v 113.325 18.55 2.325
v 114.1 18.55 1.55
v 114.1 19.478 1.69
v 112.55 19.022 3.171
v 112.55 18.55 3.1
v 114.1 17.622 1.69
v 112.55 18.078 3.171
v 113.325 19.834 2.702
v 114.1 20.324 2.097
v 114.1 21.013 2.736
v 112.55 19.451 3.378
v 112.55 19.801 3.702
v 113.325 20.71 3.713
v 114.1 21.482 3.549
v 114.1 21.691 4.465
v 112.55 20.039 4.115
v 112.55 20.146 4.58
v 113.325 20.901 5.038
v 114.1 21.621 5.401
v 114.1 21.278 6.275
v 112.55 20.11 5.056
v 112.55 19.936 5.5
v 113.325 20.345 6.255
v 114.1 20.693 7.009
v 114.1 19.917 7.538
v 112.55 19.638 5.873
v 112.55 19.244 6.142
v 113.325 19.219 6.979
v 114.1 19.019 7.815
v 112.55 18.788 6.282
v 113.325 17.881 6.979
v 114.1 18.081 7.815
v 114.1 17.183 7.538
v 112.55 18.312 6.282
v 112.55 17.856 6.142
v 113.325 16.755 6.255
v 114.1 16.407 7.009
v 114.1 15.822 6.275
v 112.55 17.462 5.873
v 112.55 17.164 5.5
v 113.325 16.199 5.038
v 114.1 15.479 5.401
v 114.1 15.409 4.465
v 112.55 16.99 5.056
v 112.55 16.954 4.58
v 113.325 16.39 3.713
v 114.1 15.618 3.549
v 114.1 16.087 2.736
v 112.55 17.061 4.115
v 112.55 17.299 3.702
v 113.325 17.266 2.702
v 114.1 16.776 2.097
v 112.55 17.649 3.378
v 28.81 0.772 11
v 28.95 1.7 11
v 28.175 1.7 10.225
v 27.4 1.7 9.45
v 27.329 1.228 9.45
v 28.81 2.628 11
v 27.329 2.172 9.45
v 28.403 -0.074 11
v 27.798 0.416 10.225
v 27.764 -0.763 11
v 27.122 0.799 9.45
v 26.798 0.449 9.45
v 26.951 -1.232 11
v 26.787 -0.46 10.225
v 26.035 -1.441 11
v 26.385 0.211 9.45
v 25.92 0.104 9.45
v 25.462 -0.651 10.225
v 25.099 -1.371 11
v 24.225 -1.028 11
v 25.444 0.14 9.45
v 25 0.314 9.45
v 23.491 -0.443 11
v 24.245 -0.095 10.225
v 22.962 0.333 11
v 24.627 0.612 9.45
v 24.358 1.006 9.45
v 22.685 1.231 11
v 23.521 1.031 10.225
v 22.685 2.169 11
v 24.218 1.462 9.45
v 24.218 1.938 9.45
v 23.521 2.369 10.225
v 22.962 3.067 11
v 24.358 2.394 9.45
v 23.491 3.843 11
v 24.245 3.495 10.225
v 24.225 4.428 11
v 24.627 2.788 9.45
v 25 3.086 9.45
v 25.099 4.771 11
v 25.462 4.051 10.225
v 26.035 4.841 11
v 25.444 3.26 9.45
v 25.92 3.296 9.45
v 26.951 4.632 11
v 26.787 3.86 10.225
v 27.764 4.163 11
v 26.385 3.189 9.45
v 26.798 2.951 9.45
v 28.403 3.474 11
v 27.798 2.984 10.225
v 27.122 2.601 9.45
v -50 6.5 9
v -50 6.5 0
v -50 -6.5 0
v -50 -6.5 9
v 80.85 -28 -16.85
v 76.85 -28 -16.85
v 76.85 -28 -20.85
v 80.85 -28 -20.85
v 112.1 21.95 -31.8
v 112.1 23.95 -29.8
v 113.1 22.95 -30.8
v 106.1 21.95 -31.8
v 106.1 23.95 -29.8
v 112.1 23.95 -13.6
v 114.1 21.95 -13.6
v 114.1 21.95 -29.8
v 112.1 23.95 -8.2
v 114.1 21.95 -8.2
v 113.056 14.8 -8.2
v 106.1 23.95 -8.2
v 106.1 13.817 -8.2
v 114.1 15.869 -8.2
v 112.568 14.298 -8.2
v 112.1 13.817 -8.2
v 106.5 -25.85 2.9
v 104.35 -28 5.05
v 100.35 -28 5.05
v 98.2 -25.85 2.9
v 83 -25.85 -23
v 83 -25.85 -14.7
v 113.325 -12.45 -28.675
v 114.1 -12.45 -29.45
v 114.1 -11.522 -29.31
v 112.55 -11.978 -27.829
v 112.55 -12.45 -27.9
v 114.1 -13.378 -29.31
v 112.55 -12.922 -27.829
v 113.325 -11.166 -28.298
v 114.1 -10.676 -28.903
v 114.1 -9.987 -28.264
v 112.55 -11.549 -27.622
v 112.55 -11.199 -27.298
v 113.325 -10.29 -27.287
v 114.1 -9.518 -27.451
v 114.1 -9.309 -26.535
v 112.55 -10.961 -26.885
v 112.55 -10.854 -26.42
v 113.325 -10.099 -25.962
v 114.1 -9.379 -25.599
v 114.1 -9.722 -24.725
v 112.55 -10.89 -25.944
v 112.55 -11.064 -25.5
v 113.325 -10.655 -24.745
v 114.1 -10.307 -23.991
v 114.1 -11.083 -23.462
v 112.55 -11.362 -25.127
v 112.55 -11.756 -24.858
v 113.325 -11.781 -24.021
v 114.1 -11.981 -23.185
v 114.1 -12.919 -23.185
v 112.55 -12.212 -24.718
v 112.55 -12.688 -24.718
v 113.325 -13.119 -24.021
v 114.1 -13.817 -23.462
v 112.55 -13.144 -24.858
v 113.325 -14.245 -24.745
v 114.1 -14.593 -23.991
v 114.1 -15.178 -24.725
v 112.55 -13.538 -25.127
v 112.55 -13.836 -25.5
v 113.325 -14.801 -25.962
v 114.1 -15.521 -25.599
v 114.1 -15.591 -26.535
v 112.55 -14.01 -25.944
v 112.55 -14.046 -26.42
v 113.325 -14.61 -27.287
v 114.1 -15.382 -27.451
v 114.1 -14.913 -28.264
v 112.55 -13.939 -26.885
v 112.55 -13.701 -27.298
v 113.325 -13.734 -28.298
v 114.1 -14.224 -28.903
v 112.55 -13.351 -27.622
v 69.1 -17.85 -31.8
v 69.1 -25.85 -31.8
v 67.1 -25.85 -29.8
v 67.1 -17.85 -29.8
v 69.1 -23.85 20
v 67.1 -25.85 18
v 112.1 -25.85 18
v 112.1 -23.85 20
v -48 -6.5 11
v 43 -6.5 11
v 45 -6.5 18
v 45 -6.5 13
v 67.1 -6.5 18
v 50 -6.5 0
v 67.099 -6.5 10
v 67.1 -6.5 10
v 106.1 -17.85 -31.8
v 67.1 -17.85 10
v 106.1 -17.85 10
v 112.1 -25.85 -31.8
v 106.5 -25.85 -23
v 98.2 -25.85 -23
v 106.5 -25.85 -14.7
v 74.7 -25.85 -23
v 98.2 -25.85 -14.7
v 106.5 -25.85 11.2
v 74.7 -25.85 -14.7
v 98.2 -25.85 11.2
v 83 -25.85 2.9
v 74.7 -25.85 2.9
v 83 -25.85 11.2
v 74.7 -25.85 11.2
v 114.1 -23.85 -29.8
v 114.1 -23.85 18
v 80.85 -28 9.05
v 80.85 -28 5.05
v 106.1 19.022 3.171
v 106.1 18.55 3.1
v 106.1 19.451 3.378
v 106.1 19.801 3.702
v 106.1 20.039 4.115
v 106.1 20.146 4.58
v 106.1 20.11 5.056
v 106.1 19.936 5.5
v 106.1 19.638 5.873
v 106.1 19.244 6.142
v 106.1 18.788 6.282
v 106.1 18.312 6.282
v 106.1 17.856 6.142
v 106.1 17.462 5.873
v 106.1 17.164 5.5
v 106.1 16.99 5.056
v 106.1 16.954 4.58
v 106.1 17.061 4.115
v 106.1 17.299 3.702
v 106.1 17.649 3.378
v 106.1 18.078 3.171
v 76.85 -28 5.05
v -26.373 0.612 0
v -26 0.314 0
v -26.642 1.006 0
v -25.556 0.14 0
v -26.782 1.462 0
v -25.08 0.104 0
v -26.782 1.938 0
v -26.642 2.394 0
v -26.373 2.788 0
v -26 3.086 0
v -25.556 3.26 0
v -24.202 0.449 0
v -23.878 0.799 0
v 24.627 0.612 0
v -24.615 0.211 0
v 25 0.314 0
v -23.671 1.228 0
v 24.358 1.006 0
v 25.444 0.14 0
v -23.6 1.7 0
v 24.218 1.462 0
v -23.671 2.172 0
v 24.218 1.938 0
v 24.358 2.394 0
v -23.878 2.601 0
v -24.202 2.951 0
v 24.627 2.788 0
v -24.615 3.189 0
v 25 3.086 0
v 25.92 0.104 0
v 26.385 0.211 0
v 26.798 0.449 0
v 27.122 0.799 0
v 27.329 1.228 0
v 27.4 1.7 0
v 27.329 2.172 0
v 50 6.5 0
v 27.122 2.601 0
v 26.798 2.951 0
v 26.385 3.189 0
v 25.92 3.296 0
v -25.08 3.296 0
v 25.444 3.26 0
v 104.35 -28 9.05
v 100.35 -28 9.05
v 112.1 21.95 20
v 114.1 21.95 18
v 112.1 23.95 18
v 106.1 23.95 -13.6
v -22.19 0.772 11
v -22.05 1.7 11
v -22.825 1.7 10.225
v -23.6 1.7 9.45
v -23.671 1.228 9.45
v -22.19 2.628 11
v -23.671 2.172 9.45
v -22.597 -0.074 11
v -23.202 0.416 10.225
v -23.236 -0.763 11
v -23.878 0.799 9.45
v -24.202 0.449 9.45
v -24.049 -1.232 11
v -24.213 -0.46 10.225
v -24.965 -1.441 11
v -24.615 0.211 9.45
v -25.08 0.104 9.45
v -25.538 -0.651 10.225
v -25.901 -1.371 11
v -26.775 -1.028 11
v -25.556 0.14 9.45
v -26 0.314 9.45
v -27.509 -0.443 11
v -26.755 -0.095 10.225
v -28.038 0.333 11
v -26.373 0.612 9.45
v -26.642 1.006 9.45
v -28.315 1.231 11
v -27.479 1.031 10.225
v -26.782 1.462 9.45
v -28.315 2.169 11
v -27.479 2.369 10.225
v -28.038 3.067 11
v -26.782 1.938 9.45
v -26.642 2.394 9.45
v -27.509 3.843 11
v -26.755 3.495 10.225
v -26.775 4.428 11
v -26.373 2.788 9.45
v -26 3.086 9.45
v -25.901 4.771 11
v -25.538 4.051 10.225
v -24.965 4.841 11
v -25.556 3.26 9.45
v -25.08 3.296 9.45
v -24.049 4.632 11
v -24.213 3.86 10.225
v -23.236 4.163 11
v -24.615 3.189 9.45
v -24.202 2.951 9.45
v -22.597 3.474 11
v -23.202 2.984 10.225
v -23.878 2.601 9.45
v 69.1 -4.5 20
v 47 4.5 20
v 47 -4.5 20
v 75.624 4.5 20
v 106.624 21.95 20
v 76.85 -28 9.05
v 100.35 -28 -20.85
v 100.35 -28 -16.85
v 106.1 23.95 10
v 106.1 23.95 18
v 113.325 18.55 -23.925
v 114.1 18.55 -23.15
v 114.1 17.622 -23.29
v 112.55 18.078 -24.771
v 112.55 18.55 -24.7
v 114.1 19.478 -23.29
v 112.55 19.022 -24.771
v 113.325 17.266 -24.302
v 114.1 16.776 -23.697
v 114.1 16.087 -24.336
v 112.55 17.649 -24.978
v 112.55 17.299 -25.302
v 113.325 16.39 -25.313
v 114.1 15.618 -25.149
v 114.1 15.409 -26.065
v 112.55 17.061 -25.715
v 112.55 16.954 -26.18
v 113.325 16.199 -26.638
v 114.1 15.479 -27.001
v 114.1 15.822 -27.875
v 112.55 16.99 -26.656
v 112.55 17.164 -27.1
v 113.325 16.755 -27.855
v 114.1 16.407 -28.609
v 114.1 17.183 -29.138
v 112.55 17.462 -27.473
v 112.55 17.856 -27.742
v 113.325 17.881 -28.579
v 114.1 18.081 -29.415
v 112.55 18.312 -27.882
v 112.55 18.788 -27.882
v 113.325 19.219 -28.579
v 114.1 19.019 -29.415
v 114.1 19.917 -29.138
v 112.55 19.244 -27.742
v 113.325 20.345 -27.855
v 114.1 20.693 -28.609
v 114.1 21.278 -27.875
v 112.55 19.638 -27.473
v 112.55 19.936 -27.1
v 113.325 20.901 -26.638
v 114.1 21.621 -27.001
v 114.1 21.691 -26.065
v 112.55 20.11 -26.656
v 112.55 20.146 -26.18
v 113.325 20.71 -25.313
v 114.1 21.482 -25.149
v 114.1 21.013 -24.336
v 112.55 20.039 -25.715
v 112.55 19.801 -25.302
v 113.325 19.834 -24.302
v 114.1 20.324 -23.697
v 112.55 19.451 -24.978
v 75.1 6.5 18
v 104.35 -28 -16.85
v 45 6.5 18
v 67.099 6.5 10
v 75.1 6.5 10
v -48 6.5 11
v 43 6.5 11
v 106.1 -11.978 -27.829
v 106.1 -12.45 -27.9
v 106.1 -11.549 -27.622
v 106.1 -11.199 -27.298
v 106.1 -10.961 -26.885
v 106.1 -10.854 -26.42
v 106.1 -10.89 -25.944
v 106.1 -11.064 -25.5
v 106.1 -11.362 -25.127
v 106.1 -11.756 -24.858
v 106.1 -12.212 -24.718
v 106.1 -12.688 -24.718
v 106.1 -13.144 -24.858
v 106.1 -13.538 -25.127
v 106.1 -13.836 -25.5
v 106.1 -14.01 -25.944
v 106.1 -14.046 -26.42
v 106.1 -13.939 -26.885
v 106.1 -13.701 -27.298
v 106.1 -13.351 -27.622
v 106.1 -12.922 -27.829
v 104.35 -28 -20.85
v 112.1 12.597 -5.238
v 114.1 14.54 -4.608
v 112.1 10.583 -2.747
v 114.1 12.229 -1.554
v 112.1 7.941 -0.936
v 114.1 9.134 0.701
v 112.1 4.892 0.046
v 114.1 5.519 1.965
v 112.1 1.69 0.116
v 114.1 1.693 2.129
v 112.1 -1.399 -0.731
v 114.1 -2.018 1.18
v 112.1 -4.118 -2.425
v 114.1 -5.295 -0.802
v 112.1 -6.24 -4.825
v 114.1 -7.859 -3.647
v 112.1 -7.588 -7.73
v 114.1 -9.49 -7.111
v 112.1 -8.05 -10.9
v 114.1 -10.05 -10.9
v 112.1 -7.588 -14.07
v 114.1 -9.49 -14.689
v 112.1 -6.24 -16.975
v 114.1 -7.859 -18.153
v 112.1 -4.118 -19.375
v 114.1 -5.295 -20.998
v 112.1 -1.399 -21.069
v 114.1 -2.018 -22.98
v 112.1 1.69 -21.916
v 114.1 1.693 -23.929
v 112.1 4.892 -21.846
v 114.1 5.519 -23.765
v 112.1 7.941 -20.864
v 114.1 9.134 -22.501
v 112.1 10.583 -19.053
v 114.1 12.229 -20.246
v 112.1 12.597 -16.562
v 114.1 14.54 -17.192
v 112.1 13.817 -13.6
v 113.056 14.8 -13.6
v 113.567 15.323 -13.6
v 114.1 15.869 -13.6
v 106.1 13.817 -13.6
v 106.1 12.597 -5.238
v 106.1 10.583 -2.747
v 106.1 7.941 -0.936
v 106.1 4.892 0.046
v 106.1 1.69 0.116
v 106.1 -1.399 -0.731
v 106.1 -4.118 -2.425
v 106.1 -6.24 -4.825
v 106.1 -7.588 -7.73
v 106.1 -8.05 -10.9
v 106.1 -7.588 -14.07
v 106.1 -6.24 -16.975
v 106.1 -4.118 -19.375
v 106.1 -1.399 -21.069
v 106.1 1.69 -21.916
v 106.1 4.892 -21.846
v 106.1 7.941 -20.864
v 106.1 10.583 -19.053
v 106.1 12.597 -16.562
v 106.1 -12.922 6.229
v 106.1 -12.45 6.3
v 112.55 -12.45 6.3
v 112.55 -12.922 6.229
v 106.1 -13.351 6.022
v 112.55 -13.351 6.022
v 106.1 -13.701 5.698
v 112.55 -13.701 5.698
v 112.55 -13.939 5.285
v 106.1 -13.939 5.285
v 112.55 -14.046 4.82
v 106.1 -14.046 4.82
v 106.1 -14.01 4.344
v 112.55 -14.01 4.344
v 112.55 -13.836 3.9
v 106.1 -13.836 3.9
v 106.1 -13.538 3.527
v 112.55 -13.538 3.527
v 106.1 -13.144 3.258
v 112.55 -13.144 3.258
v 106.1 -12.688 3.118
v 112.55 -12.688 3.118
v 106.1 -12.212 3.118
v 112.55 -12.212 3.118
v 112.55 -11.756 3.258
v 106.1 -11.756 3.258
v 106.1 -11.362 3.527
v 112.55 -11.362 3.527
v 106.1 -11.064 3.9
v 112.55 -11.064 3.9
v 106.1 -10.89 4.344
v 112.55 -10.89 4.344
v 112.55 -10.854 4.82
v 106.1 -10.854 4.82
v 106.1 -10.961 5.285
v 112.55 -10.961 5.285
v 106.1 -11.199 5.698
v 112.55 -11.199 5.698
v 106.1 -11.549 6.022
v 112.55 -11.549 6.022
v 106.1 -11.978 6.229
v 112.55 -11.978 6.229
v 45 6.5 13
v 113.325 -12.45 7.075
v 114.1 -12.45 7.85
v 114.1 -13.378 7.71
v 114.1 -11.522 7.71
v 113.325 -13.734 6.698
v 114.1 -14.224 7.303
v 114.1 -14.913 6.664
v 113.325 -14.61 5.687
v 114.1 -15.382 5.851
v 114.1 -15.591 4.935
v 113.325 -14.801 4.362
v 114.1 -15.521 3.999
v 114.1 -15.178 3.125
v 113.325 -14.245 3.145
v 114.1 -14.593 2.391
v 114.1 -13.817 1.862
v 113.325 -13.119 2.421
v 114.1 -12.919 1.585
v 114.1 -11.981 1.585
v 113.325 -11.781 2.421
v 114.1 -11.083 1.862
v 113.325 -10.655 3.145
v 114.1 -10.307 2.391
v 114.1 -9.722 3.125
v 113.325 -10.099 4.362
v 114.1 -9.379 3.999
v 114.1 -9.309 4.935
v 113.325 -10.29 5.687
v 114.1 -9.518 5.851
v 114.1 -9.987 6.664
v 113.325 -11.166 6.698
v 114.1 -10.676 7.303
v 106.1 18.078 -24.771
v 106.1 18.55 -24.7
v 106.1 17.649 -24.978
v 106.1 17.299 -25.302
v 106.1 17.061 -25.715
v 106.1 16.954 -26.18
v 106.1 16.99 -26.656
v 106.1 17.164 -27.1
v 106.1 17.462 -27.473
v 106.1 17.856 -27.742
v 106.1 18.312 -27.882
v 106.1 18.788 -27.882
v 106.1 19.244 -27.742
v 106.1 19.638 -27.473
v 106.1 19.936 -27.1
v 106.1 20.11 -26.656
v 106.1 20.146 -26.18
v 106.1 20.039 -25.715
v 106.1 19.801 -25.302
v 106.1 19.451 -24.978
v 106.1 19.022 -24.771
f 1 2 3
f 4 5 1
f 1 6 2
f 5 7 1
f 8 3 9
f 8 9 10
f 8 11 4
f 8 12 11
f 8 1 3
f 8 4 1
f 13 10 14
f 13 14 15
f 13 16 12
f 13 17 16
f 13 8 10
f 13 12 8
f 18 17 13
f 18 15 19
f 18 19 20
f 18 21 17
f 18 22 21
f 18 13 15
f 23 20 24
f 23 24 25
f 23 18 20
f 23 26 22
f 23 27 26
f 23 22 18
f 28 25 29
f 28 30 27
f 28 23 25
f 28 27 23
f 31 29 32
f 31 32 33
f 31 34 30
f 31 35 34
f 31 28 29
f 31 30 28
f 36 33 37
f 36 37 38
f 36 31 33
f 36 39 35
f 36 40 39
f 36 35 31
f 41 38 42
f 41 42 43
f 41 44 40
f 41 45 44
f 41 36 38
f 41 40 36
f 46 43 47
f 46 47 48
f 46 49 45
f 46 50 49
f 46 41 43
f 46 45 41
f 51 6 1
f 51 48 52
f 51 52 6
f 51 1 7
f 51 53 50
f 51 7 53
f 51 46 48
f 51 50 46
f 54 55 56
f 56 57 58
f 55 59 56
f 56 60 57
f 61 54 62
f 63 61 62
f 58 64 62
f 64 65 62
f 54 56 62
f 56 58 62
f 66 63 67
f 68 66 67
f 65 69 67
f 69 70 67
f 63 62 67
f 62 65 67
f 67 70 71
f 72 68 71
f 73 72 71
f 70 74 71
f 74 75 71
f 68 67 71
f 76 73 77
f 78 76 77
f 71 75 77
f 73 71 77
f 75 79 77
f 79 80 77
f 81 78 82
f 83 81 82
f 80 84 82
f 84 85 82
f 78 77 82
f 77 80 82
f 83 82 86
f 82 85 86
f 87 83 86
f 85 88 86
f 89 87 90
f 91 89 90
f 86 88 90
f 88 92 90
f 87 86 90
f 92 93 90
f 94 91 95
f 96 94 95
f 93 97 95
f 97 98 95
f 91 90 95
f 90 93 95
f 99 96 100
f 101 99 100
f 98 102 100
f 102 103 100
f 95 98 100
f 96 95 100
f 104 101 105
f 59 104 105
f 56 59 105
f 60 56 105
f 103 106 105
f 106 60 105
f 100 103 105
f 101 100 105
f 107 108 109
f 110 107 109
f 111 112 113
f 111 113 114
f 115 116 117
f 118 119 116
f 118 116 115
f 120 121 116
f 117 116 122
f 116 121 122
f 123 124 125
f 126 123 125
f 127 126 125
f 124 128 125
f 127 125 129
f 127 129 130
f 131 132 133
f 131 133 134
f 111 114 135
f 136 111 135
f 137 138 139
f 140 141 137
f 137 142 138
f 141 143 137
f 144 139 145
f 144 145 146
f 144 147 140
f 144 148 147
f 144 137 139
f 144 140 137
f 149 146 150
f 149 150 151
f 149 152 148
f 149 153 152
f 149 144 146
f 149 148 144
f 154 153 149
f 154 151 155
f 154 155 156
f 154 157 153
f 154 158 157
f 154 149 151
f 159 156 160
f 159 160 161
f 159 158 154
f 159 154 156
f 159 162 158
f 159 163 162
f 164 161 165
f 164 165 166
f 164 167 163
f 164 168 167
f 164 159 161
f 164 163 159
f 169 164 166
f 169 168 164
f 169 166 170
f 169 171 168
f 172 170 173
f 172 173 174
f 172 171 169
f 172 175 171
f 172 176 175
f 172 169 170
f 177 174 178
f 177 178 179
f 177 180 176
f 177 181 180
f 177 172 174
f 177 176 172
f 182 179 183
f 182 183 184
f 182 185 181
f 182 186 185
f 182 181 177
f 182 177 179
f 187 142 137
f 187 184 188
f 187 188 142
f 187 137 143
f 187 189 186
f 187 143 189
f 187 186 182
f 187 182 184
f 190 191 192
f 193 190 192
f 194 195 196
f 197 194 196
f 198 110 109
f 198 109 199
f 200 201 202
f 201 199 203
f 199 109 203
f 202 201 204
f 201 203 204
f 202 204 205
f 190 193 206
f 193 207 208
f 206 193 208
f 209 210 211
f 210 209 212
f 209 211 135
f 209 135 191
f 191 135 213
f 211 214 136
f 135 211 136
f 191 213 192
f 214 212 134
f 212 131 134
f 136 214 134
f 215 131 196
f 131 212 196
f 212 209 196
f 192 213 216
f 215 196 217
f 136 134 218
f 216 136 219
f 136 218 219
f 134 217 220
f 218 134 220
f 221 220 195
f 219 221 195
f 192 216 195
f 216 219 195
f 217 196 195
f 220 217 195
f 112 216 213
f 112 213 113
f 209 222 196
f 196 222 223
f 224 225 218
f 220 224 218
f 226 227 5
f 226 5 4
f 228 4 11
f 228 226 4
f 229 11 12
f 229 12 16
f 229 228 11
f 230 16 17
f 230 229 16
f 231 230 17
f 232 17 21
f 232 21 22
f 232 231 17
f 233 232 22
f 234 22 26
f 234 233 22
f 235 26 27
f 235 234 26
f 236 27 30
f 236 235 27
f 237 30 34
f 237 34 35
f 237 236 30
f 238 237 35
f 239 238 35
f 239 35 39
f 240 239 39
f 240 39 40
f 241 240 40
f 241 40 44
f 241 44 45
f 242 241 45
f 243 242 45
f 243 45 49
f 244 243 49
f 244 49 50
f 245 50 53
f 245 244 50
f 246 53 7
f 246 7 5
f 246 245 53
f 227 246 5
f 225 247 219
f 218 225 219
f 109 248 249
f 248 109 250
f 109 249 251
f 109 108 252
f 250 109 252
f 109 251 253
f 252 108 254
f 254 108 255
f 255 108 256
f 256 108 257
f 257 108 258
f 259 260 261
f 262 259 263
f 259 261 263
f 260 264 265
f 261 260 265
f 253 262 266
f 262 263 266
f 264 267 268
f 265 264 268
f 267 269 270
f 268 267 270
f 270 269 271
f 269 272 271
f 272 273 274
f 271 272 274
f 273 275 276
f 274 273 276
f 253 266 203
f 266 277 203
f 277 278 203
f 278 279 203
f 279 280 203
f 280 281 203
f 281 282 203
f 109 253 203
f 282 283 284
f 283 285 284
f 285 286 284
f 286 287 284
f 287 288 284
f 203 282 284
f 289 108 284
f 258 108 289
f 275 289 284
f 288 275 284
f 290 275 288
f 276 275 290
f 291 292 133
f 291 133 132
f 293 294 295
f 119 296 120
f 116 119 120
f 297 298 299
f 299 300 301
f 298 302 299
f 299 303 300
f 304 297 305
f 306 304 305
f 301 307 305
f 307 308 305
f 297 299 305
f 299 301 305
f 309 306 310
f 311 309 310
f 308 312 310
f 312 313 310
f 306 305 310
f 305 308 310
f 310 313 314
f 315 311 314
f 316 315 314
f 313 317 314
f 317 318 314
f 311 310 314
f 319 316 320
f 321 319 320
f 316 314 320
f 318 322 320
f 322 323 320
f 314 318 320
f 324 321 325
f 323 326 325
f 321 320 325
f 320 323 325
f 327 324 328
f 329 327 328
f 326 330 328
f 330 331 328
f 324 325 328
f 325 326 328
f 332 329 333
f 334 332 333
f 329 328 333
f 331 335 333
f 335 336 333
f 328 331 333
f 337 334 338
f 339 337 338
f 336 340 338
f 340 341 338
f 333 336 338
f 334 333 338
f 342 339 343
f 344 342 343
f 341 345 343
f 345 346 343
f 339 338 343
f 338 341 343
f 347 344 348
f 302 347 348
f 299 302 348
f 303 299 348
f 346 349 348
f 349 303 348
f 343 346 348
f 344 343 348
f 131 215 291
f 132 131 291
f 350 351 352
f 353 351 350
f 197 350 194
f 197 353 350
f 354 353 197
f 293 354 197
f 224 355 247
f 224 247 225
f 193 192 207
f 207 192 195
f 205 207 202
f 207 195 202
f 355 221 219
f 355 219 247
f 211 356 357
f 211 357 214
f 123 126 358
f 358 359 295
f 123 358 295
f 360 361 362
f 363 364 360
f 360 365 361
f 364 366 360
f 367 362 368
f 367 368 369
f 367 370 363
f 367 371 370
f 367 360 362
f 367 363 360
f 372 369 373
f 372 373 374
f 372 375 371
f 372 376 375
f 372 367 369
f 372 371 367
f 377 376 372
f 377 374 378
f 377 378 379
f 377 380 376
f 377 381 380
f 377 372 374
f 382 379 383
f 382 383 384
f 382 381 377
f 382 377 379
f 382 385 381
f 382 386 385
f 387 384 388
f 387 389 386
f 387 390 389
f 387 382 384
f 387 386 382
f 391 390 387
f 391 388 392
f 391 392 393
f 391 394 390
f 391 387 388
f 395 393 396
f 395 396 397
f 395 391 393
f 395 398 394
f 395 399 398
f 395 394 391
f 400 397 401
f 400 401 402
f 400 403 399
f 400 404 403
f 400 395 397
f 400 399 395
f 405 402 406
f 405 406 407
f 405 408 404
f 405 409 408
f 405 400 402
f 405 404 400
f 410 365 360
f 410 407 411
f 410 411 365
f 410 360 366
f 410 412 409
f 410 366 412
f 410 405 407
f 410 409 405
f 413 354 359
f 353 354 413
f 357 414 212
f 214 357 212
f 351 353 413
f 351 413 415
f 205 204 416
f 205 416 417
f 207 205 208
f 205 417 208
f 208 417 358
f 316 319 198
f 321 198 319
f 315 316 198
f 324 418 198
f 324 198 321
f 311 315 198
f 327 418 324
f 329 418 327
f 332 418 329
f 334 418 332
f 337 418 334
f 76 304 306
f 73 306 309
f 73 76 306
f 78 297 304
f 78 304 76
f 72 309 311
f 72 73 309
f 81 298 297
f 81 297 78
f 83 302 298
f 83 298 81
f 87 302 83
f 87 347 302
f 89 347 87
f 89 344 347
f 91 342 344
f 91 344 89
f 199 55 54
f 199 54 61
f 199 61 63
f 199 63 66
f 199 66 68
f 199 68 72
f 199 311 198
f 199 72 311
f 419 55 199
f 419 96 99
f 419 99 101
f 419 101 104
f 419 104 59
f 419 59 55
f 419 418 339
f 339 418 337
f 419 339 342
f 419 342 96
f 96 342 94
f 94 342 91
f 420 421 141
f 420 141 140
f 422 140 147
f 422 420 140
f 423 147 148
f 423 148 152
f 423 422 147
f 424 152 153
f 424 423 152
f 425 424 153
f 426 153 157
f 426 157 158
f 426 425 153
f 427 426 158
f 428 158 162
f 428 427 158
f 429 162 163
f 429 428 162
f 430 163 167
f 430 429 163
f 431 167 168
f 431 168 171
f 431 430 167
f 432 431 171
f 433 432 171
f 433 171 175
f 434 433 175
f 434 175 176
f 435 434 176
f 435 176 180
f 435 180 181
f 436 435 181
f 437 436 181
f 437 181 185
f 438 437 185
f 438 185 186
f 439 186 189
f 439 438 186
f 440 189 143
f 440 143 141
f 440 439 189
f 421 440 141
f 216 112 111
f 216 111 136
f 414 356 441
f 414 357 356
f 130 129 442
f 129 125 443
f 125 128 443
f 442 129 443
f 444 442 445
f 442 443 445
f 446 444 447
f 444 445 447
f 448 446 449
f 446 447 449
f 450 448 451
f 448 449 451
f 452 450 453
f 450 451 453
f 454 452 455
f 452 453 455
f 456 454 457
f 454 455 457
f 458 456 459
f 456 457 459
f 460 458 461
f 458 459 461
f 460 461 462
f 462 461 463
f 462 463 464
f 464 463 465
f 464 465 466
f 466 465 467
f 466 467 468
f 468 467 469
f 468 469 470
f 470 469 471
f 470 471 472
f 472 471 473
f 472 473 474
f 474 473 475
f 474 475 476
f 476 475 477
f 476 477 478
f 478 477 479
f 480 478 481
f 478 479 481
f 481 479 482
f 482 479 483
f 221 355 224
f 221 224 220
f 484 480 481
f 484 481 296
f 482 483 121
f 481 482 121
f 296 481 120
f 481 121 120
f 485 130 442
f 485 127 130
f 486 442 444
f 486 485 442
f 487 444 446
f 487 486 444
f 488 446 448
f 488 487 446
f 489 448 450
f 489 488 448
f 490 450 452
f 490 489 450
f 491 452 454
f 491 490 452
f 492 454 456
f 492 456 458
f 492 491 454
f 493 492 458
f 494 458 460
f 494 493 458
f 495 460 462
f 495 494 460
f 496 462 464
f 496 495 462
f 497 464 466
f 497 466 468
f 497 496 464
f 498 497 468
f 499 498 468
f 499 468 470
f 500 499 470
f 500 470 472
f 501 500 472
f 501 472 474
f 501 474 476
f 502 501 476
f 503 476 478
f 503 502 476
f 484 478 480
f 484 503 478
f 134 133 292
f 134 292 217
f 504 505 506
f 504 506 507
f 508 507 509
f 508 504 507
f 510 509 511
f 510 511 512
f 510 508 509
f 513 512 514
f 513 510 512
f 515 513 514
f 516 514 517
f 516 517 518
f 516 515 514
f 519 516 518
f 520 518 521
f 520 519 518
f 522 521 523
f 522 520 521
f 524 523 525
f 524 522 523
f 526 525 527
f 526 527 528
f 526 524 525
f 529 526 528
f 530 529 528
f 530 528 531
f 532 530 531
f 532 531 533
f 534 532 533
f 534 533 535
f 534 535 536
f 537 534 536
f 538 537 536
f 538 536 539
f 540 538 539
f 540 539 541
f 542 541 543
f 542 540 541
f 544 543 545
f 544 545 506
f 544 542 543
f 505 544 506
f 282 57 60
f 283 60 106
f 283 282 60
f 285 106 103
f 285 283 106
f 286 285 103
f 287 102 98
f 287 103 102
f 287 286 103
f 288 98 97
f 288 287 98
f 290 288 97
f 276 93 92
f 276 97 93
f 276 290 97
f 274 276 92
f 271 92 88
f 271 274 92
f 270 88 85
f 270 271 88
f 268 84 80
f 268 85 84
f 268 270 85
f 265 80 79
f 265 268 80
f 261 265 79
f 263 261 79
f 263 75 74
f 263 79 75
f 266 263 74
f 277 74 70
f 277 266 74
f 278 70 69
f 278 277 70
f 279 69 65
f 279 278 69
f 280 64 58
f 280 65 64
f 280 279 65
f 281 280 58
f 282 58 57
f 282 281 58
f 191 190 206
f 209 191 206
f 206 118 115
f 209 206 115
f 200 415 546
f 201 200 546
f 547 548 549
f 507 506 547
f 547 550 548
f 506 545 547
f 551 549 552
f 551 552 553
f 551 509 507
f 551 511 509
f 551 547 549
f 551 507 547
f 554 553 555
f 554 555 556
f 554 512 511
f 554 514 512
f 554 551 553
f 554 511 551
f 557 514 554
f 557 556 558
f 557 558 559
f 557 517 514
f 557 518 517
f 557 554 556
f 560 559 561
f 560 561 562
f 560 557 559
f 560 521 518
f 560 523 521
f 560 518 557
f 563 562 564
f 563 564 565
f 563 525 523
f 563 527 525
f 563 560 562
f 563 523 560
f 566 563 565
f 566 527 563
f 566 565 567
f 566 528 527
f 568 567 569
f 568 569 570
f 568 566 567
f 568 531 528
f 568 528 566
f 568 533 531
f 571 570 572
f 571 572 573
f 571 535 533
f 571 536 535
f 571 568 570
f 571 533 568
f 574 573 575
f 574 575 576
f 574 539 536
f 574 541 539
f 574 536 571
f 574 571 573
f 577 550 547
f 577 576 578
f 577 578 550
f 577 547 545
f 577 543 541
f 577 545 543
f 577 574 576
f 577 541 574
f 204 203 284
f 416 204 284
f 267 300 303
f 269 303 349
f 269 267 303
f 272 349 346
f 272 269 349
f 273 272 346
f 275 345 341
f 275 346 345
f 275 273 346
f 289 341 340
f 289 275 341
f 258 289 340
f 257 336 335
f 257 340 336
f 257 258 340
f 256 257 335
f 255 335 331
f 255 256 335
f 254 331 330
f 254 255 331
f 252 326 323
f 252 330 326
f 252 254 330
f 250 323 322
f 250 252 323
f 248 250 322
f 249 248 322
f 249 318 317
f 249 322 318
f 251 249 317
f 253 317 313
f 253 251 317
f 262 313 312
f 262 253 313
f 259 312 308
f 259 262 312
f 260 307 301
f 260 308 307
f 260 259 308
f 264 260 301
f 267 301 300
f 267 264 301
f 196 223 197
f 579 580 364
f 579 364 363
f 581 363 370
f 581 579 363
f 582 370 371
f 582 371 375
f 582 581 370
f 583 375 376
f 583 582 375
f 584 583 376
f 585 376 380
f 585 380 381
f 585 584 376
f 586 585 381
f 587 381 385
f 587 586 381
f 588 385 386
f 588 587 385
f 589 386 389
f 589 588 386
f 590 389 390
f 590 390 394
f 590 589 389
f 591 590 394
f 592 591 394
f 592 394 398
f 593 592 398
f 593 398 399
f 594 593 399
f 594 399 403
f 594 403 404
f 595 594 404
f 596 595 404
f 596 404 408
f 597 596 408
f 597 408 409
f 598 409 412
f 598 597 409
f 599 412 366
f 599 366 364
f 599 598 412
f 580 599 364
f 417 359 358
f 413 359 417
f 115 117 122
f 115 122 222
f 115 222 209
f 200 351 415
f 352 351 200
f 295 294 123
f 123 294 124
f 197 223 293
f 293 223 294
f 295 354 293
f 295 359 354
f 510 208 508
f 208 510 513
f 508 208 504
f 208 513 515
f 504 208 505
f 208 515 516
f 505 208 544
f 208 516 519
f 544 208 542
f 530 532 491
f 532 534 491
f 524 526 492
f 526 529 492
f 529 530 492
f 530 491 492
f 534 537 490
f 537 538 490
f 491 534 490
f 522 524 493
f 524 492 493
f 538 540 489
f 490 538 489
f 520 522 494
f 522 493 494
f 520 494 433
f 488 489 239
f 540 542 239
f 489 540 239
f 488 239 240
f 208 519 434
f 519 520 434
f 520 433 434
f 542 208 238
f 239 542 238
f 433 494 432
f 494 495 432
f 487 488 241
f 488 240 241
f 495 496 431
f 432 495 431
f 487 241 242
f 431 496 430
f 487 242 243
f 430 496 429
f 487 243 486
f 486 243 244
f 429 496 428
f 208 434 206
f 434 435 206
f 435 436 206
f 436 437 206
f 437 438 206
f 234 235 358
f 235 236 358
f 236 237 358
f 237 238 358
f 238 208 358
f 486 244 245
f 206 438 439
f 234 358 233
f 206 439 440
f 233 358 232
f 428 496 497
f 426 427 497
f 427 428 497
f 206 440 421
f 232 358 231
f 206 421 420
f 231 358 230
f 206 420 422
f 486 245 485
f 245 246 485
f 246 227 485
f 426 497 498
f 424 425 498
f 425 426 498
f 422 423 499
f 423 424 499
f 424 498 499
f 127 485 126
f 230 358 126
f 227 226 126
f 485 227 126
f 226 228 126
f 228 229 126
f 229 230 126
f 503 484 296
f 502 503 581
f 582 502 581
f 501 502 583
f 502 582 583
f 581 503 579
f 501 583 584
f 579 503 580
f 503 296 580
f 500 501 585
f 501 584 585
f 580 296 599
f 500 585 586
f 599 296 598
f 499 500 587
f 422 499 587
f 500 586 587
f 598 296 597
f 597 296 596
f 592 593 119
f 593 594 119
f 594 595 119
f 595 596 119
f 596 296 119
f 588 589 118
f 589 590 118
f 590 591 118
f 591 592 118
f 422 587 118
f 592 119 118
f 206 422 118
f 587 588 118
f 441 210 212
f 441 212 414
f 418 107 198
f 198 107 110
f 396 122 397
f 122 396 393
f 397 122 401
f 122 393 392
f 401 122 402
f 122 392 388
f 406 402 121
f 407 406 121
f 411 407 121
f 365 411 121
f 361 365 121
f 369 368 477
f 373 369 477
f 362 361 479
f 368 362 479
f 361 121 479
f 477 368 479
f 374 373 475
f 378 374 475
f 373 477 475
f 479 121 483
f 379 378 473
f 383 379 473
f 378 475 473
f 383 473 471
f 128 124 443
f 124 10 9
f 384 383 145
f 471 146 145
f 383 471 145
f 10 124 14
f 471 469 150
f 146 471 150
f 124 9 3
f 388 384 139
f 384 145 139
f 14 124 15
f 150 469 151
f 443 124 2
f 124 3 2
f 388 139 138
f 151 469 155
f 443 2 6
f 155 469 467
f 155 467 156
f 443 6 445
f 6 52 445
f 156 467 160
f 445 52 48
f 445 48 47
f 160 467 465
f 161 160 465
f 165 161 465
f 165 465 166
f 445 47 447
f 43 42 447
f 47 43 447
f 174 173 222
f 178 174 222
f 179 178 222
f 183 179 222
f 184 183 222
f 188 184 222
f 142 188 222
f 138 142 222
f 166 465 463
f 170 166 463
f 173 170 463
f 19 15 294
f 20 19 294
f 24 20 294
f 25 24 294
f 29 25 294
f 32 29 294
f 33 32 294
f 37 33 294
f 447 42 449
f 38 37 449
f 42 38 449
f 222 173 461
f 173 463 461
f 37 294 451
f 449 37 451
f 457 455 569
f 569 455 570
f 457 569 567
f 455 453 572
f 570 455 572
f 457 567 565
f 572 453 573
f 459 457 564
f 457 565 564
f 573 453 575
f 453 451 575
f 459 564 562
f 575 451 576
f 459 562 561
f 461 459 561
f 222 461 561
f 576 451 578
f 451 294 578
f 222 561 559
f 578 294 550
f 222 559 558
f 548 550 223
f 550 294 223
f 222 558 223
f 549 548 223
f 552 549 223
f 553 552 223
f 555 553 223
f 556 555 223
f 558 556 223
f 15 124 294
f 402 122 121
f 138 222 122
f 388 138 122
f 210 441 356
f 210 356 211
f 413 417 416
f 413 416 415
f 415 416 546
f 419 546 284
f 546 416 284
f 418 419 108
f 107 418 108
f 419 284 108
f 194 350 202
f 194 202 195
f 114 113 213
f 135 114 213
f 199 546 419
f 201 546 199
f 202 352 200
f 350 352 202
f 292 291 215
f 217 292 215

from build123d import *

# Parameters (mm, degrees)
SKETCH1_W           = 100
SKETCH1_H           = 13
SKETCH1_R           = 1.6
BOSS_EXTRUDE1_DEPTH = 10
SKETCH2_R           = 1.6
BOSS_EXTRUDE2_DEPTH = 10
SKETCH4_R           = 1.6
SKETCH4_R_2         = 11.1
BOSS_EXTRUDE3_DEPTH = 8
SKETCH5_W           = 47
SKETCH5_H           = 51.8
BOSS_EXTRUDE4_DEPTH = 8
SKETCH6_W           = 39
SKETCH6_H           = 11.35
BOSS_EXTRUDE5_DEPTH = 10
BOSS_EXTRUDE6_DEPTH = 8
SKETCH8_W           = 10
SKETCH8_H           = 10
BOSS_EXTRUDE7_DEPTH = 2.15
CHAMFER1_SIZE2      = 17.09924405
CHAMFER1_SIZE       = 10
CHAMFER3_SIZE       = 2
CHAMFER4_SIZE       = 3
CHAMFER5_SIZE       = 1.55
SKETCH9_W           = 95
SKETCH9_H           = 9
CUT_EXTRUDE1_DEPTH  = 126.670601176
CHAMFER6_SIZE       = 1.55
CHAMFER7_SIZE       = 2
SKETCH11_W          = 47
SKETCH11_H          = 8
CUT_EXTRUDE3_DEPTH  = 132.535746092
CUT_EXTRUDE4_DEPTH  = 170.481709928
CHAMFER9_SIZE       = 2


# Some blends are built 0.0001 mm under size
with BuildPart() as part:
    # Sketch1 → Boss-Extrude1 (new body)
    with BuildSketch(Plane.XY):
        Rectangle(SKETCH1_W, SKETCH1_H)
        with Locations((25.8, 1.7)):
            Circle(SKETCH1_R, mode=Mode.SUBTRACT)
        with Locations((-25.2, 1.7)):
            Circle(SKETCH1_R, mode=Mode.SUBTRACT)
    extrude(amount=BOSS_EXTRUDE1_DEPTH)

    # Sketch2 → Boss-Extrude2 (add)
    with BuildSketch(Plane.XY.offset(10)):
        Polygon((50, -6.5), (106.1, -6.5), (106.1, 6.5), (50, 6.5), (-50, 6.5), (-50, -6.5), align=None)
        with Locations((25.8, 1.7)):
            Circle(SKETCH2_R, mode=Mode.SUBTRACT)
        with Locations((-25.2, 1.7)):
            Circle(SKETCH2_R, mode=Mode.SUBTRACT)
    extrude(amount=BOSS_EXTRUDE2_DEPTH)

    # Sketch4 → Boss-Extrude3 (add)
    with BuildSketch(Plane(origin=(106.1, 0, 0), x_dir=(0, 0, -1), z_dir=(1, 0, 0))):
        Polygon((-20, -6.5), (-20, -17.85), (31.8, -17.85), (31.8, 23.95), (-20, 23.95), align=None)
        with Locations((-4.7, 18.55)):
            Circle(SKETCH4_R, mode=Mode.SUBTRACT)
        with Locations(Location((26.3, 18.55, 0), (0, 0, 180))):
            Circle(SKETCH4_R, mode=Mode.SUBTRACT)
        with Locations((26.3, -12.45)):
            Circle(SKETCH4_R, mode=Mode.SUBTRACT)
        with Locations(Location((-4.7, -12.45, 0), (0, 0, 180))):
            Circle(SKETCH4_R, mode=Mode.SUBTRACT)
        with Locations((10.9, 3.05)):
            Circle(SKETCH4_R_2, mode=Mode.SUBTRACT)
    extrude(amount=BOSS_EXTRUDE3_DEPTH)

    # Sketch5 → Boss-Extrude4 (add)
    with BuildSketch(Plane.XZ.offset(17.85)):
        with Locations((90.6, -5.9)):
            Rectangle(SKETCH5_W, SKETCH5_H)
    extrude(amount=BOSS_EXTRUDE4_DEPTH)

    # Sketch6 → Boss-Extrude5 (add)
    with BuildSketch(Plane.XY.offset(20)):
        Polygon((106.1, 23.95), (75.1, 6.5), (106.1, 6.5), align=None)
        with Locations((86.6, -12.175)):
            Rectangle(SKETCH6_W, SKETCH6_H)
    extrude(amount=-BOSS_EXTRUDE5_DEPTH)

    # Sketch7 → Boss-Extrude6 (add)
    with BuildSketch(Plane(origin=(0, 0, -31.8), x_dir=(-1, 0, 0), z_dir=(0, 0, -1))):
        Polygon((-67.1, -17.85), (-67.1, -6.5), (-67.1, 1.996774194), (-106.1, 23.95), (-114.1, 23.95), (-114.1, -25.85), (-67.1, -25.85), align=None)
    extrude(amount=BOSS_EXTRUDE6_DEPTH)

    # Sketch8 → Boss-Extrude7 (add)
    with BuildSketch(Plane.XZ.offset(25.85)):
        with Locations((78.85, 7.05)):
            Rectangle(SKETCH8_W, SKETCH8_H)
        with Locations((102.35, 7.05)):
            Rectangle(SKETCH8_W, SKETCH8_H)
        with Locations((102.35, -18.85)):
            Rectangle(SKETCH8_W, SKETCH8_H)
        with Locations((78.85, -18.85)):
            Rectangle(SKETCH8_W, SKETCH8_H)
    extrude(amount=BOSS_EXTRUDE7_DEPTH)

    # Chamfer1
    chamfer1_edges = [part.edges().sort_by_distance(p)[0] for p in [
        (50, 0, 10),
    ]]
    chamfer1_side = [part.faces().sort_by_distance(p)[0] for p in [
        (50, 0, 9.8),
    ]]
    chamfer(chamfer1_edges, length=CHAMFER1_SIZE - 0.0001, length2=CHAMFER1_SIZE2 - 0.0001, reference=chamfer1_side[0])  # a hair under: the kernel refuses the full size

    # Chamfer3
    chamfer3_edges = [part.edges().sort_by_distance(p)[0] for p in [
        (86.6, 12.973387097, -39.8),
        (110.1, 23.95, -39.8),
        (114.1, -0.95, -39.8),
        (90.6, -25.85, -39.8),
        (-50, 0, 20),
        (114.1, -0.95, 20),
        (114.1, 23.95, -9.9),
        (110.1, 23.95, 20),
        (114.1, 3.05, 0.2),
        (67.1, -16.175, 20),
        (114.1, -25.85, -9.9),
        (90.6, -25.85, 20),
    ]]
    chamfer(chamfer3_edges, length=CHAMFER3_SIZE)

    # Chamfer4
    # the kernel refuses this chamfer: 3 mm, written as the material it takes off along each edge
    with BuildSketch(Plane(origin=(115.065048964, -28, 2.05), x_dir=(0, -0.027495876610586775, 0.9996219169112968), z_dir=(-1, 0, 0))) as chamfer4_piece_1_section:
        Polygon((CHAMFER4_SIZE * 0.999621916911, CHAMFER4_SIZE * 0.0274958766106), (-CHAMFER4_SIZE * 0.0274958766106, CHAMFER4_SIZE * 0.999621916911), (0, 0), align=None)
    chamfer4_piece_1 = extrude(amount=25.430097928, mode=Mode.PRIVATE)
    chamfer4_piece_1 = split(chamfer4_piece_1, bisect_by=Plane(origin=(102.35, -25.85, 3.119652888), z_dir=(0, -1, 0)), keep=Keep.TOP, mode=Mode.PRIVATE)
    add(chamfer4_piece_1, mode=Mode.SUBTRACT)
    with BuildSketch(Plane(origin=(97.35, -28, -5.665048964), x_dir=(0.9996219169112965, -0.02749587661058676, 0), z_dir=(0, 0, 1))) as chamfer4_piece_2_section:
        Polygon((CHAMFER4_SIZE * 0.999621916911, CHAMFER4_SIZE * 0.0274958766106), (-CHAMFER4_SIZE * 0.0274958766106, CHAMFER4_SIZE * 0.999621916911), (0, 0), align=None)
    chamfer4_piece_2 = extrude(amount=25.430097928, mode=Mode.PRIVATE)
    chamfer4_piece_2 = split(chamfer4_piece_2, bisect_by=Plane(origin=(98.419652888, -25.85, 7.05), z_dir=(0, -1, 0)), keep=Keep.TOP, mode=Mode.PRIVATE)
    add(chamfer4_piece_2, mode=Mode.SUBTRACT)
    with BuildSketch(Plane(origin=(89.634951036, -28, 12.05), x_dir=(0, -0.02749587661058678, -0.9996219169112968), z_dir=(1, 0, 0))) as chamfer4_piece_3_section:
        Polygon((CHAMFER4_SIZE * 0.999621916911, CHAMFER4_SIZE * 0.0274958766106), (-CHAMFER4_SIZE * 0.0274958766106, CHAMFER4_SIZE * 0.999621916911), (0, 0), align=None)
    chamfer4_piece_3 = extrude(amount=25.430097928, mode=Mode.PRIVATE)
    chamfer4_piece_3 = split(chamfer4_piece_3, bisect_by=Plane(origin=(102.35, -25.85, 10.980347112), z_dir=(0, -1, 0)), keep=Keep.TOP, mode=Mode.PRIVATE)
    add(chamfer4_piece_3, mode=Mode.SUBTRACT)
    with BuildSketch(Plane(origin=(107.35, -28, 19.765048964), x_dir=(0.027495876610586768, 0.9996219169112968, 0), z_dir=(0, 0, -1))) as chamfer4_piece_4_section:
        Polygon((CHAMFER4_SIZE * 0.999621916911, -CHAMFER4_SIZE * 0.0274958766106), (-CHAMFER4_SIZE * 0.0274958766106, -CHAMFER4_SIZE * 0.999621916911), (0, 0), align=None)
    chamfer4_piece_4 = extrude(amount=25.430097928, mode=Mode.PRIVATE)
    chamfer4_piece_4 = split(chamfer4_piece_4, bisect_by=Plane(origin=(106.280347112, -25.85, 7.05), z_dir=(0, -1, 0)), keep=Keep.TOP, mode=Mode.PRIVATE)
    add(chamfer4_piece_4, mode=Mode.SUBTRACT)
    with BuildSketch(Plane(origin=(91.565048964, -28, 2.05), x_dir=(0, -0.027495876610586775, 0.9996219169112968), z_dir=(-1, 0, 0))) as chamfer4_piece_5_section:
        Polygon((CHAMFER4_SIZE * 0.999621916911, CHAMFER4_SIZE * 0.0274958766106), (-CHAMFER4_SIZE * 0.0274958766106, CHAMFER4_SIZE * 0.999621916911), (0, 0), align=None)
    chamfer4_piece_5 = extrude(amount=25.430097928, mode=Mode.PRIVATE)
    chamfer4_piece_5 = split(chamfer4_piece_5, bisect_by=Plane(origin=(78.85, -25.85, 3.119652888), z_dir=(0, -1, 0)), keep=Keep.TOP, mode=Mode.PRIVATE)
    add(chamfer4_piece_5, mode=Mode.SUBTRACT)
    with BuildSketch(Plane(origin=(73.85, -28, -5.665048964), x_dir=(-0.027495876610586768, 0.9996219169112968, 0), z_dir=(0, 0, 1))) as chamfer4_piece_6_section:
        Polygon((CHAMFER4_SIZE * 0.999621916911, -CHAMFER4_SIZE * 0.0274958766106), (-CHAMFER4_SIZE * 0.0274958766106, -CHAMFER4_SIZE * 0.999621916911), (0, 0), align=None)
    chamfer4_piece_6 = extrude(amount=25.430097928, mode=Mode.PRIVATE)
    chamfer4_piece_6 = split(chamfer4_piece_6, bisect_by=Plane(origin=(74.919652888, -25.85, 7.05), z_dir=(0, -1, 0)), keep=Keep.TOP, mode=Mode.PRIVATE)
    add(chamfer4_piece_6, mode=Mode.SUBTRACT)
    with BuildSketch(Plane(origin=(66.134951036, -28, 12.05), x_dir=(0, -0.02749587661058678, -0.9996219169112968), z_dir=(1, 0, 0))) as chamfer4_piece_7_section:
        Polygon((CHAMFER4_SIZE * 0.999621916911, CHAMFER4_SIZE * 0.0274958766106), (-CHAMFER4_SIZE * 0.0274958766106, CHAMFER4_SIZE * 0.999621916911), (0, 0), align=None)
    chamfer4_piece_7 = extrude(amount=25.430097928, mode=Mode.PRIVATE)
    chamfer4_piece_7 = split(chamfer4_piece_7, bisect_by=Plane(origin=(78.85, -25.85, 10.980347112), z_dir=(0, -1, 0)), keep=Keep.TOP, mode=Mode.PRIVATE)
    add(chamfer4_piece_7, mode=Mode.SUBTRACT)
    with BuildSketch(Plane(origin=(83.85, -28, 19.765048964), x_dir=(-0.9996219169112965, -0.02749587661058676, 0), z_dir=(0, 0, -1))) as chamfer4_piece_8_section:
        Polygon((CHAMFER4_SIZE * 0.999621916911, CHAMFER4_SIZE * 0.0274958766106), (-CHAMFER4_SIZE * 0.0274958766106, CHAMFER4_SIZE * 0.999621916911), (0, 0), align=None)
    chamfer4_piece_8 = extrude(amount=25.430097928, mode=Mode.PRIVATE)
    chamfer4_piece_8 = split(chamfer4_piece_8, bisect_by=Plane(origin=(82.780347112, -25.85, 7.05), z_dir=(0, -1, 0)), keep=Keep.TOP, mode=Mode.PRIVATE)
    add(chamfer4_piece_8, mode=Mode.SUBTRACT)
    with BuildSketch(Plane(origin=(97.35, -28, -6.134951036), x_dir=(0.9996219169112965, -0.02749587661058676, 0), z_dir=(0, 0, -1))) as chamfer4_piece_9_section:
        Polygon((CHAMFER4_SIZE * 0.999621916911, -CHAMFER4_SIZE * 0.0274958766106), (-CHAMFER4_SIZE * 0.0274958766106, -CHAMFER4_SIZE * 0.999621916911), (0, 0), align=None)
    chamfer4_piece_9 = extrude(amount=25.430097928, mode=Mode.PRIVATE)
    chamfer4_piece_9 = split(chamfer4_piece_9, bisect_by=Plane(origin=(98.419652888, -25.85, -18.85), z_dir=(0, -1, 0)), keep=Keep.TOP, mode=Mode.PRIVATE)
    add(chamfer4_piece_9, mode=Mode.SUBTRACT)
    with BuildSketch(Plane(origin=(115.065048964, -28, -13.85), x_dir=(0, -0.027495876610586768, -0.9996219169112968), z_dir=(-1, 0, 0))) as chamfer4_piece_10_section:
        Polygon((CHAMFER4_SIZE * 0.999621916911, -CHAMFER4_SIZE * 0.0274958766106), (-CHAMFER4_SIZE * 0.0274958766106, -CHAMFER4_SIZE * 0.999621916911), (0, 0), align=None)
    chamfer4_piece_10 = extrude(amount=25.430097928, mode=Mode.PRIVATE)
    chamfer4_piece_10 = split(chamfer4_piece_10, bisect_by=Plane(origin=(102.35, -25.85, -14.919652888), z_dir=(0, -1, 0)), keep=Keep.TOP, mode=Mode.PRIVATE)
    add(chamfer4_piece_10, mode=Mode.SUBTRACT)
    with BuildSketch(Plane(origin=(107.35, -28, -31.565048964), x_dir=(0.027495876610586768, 0.9996219169112968, 0), z_dir=(0, 0, 1))) as chamfer4_piece_11_section:
        Polygon((CHAMFER4_SIZE * 0.999621916911, CHAMFER4_SIZE * 0.0274958766106), (-CHAMFER4_SIZE * 0.0274958766106, CHAMFER4_SIZE * 0.999621916911), (0, 0), align=None)
    chamfer4_piece_11 = extrude(amount=25.430097928, mode=Mode.PRIVATE)
    chamfer4_piece_11 = split(chamfer4_piece_11, bisect_by=Plane(origin=(106.280347112, -25.85, -18.85), z_dir=(0, -1, 0)), keep=Keep.TOP, mode=Mode.PRIVATE)
    add(chamfer4_piece_11, mode=Mode.SUBTRACT)
    with BuildSketch(Plane(origin=(89.634951036, -28, -23.85), x_dir=(0, -0.027495876610586768, 0.9996219169112968), z_dir=(1, 0, 0))) as chamfer4_piece_12_section:
        Polygon((CHAMFER4_SIZE * 0.999621916911, -CHAMFER4_SIZE * 0.0274958766106), (-CHAMFER4_SIZE * 0.0274958766106, -CHAMFER4_SIZE * 0.999621916911), (0, 0), align=None)
    chamfer4_piece_12 = extrude(amount=25.430097928, mode=Mode.PRIVATE)
    chamfer4_piece_12 = split(chamfer4_piece_12, bisect_by=Plane(origin=(102.35, -25.85, -22.780347112), z_dir=(0, -1, 0)), keep=Keep.TOP, mode=Mode.PRIVATE)
    add(chamfer4_piece_12, mode=Mode.SUBTRACT)
    with BuildSketch(Plane(origin=(66.134951036, -28, -13.85), x_dir=(0, -0.027495876610586768, -0.9996219169112968), z_dir=(1, 0, 0))) as chamfer4_piece_13_section:
        Polygon((CHAMFER4_SIZE * 0.999621916911, CHAMFER4_SIZE * 0.0274958766106), (-CHAMFER4_SIZE * 0.0274958766106, CHAMFER4_SIZE * 0.999621916911), (0, 0), align=None)
    chamfer4_piece_13 = extrude(amount=25.430097928, mode=Mode.PRIVATE)
    chamfer4_piece_13 = split(chamfer4_piece_13, bisect_by=Plane(origin=(78.85, -25.85, -14.919652888), z_dir=(0, -1, 0)), keep=Keep.TOP, mode=Mode.PRIVATE)
    add(chamfer4_piece_13, mode=Mode.SUBTRACT)
    with BuildSketch(Plane(origin=(83.85, -28, -6.134951036), x_dir=(-0.9996219169112965, -0.02749587661058676, 0), z_dir=(0, 0, -1))) as chamfer4_piece_14_section:
        Polygon((CHAMFER4_SIZE * 0.999621916911, CHAMFER4_SIZE * 0.0274958766106), (-CHAMFER4_SIZE * 0.0274958766106, CHAMFER4_SIZE * 0.999621916911), (0, 0), align=None)
    chamfer4_piece_14 = extrude(amount=25.430097928, mode=Mode.PRIVATE)
    chamfer4_piece_14 = split(chamfer4_piece_14, bisect_by=Plane(origin=(82.780347112, -25.85, -18.85), z_dir=(0, -1, 0)), keep=Keep.TOP, mode=Mode.PRIVATE)
    add(chamfer4_piece_14, mode=Mode.SUBTRACT)
    with BuildSketch(Plane(origin=(91.565048964, -28, -23.85), x_dir=(0, -0.027495876610586768, 0.9996219169112968), z_dir=(-1, 0, 0))) as chamfer4_piece_15_section:
        Polygon((CHAMFER4_SIZE * 0.999621916911, CHAMFER4_SIZE * 0.0274958766106), (-CHAMFER4_SIZE * 0.0274958766106, CHAMFER4_SIZE * 0.999621916911), (0, 0), align=None)
    chamfer4_piece_15 = extrude(amount=25.430097928, mode=Mode.PRIVATE)
    chamfer4_piece_15 = split(chamfer4_piece_15, bisect_by=Plane(origin=(78.85, -25.85, -22.780347112), z_dir=(0, -1, 0)), keep=Keep.TOP, mode=Mode.PRIVATE)
    add(chamfer4_piece_15, mode=Mode.SUBTRACT)
    with BuildSketch(Plane(origin=(73.85, -28, -31.565048964), x_dir=(-0.027495876610586768, 0.9996219169112968, 0), z_dir=(0, 0, 1))) as chamfer4_piece_16_section:
        Polygon((CHAMFER4_SIZE * 0.999621916911, -CHAMFER4_SIZE * 0.0274958766106), (-CHAMFER4_SIZE * 0.0274958766106, -CHAMFER4_SIZE * 0.999621916911), (0, 0), align=None)
    chamfer4_piece_16 = extrude(amount=25.430097928, mode=Mode.PRIVATE)
    chamfer4_piece_16 = split(chamfer4_piece_16, bisect_by=Plane(origin=(74.919652888, -25.85, -18.85), z_dir=(0, -1, 0)), keep=Keep.TOP, mode=Mode.PRIVATE)
    add(chamfer4_piece_16, mode=Mode.SUBTRACT)

    # Chamfer5
    chamfer5_edges = [part.edges().sort_by_distance(p)[0] for p in [
        (114.1, 18.55, 6.3),
        (114.1, 18.55, -27.9),
        (114.1, -12.45, -24.7),
        (114.1, -12.45, 3.1),
    ]]
    chamfer(chamfer5_edges, length=CHAMFER5_SIZE)

    # Sketch9 → Cut-Extrude1 (cut, through all)
    with BuildSketch(Plane(origin=(0, 6.5, 0), x_dir=(1, 0, 0), z_dir=(0, 1, 0))):
        with Locations((-2.5, -15.5)):
            Rectangle(SKETCH9_W, SKETCH9_H)
    extrude(amount=-CUT_EXTRUDE1_DEPTH, mode=Mode.SUBTRACT)

    # Chamfer6
    chamfer6_edges = [part.edges().sort_by_distance(p)[0] for p in [
        (24.2, 1.7, 11),
        (-26.8, 1.7, 11),
    ]]
    chamfer(chamfer6_edges, length=CHAMFER6_SIZE)

    # Chamfer7
    chamfer7_edges = [part.edges().sort_by_distance(p)[0] for p in [
        (45, 0, 20),
        (45, 0, 11),
        (-50, 0, 11),
        (88.823495702, 14.225, 20),
        (57.05, -6.5, 20),
        (60.05, 6.5, 20),
    ]]
    chamfer(chamfer7_edges, length=CHAMFER7_SIZE)

    # Sketch11 → Cut-Extrude3 (cut, through all)
    with BuildSketch(Plane(origin=(0, 23.95, 0), x_dir=(1, 0, 0), z_dir=(0, 1, 0))):
        with Locations((90.6, 35.8)):
            Rectangle(SKETCH11_W, SKETCH11_H)
    extrude(amount=-CUT_EXTRUDE3_DEPTH, mode=Mode.SUBTRACT)

    # Sketch13 → Cut-Extrude4 (cut, through all)
    with BuildSketch(Plane(origin=(114.1, 0, 0), x_dir=(0, 0, -1), z_dir=(1, 0, 0))):
        with BuildLine():
            Line((13.6, 13.816615067), (13.6, 23.95))
            Line((13.6, 23.95), (8.2, 23.95))
            Line((8.2, 23.95), (8.2, 13.816615067))
            ThreePointArc((8.2, 13.816615067), (10.9, 14.15), (13.6, 13.816615067))
        make_face()
    extrude(amount=-CUT_EXTRUDE4_DEPTH, mode=Mode.SUBTRACT)

    # Chamfer9
    # the kernel refuses this chamfer: 2 mm, written as the material it takes off along each edge
    with BuildSketch(Plane(origin=(67.1, -12.706634024, -31.8), x_dir=(0.9996219169112968, 0, -0.02749587661058555), z_dir=(0, -1, 0))) as chamfer9_piece_1:
        Polygon((CHAMFER9_SIZE * 0.999621916911, CHAMFER9_SIZE * 0.0274958766106), (-CHAMFER9_SIZE * 0.0274958766106, CHAMFER9_SIZE * 0.999621916911), (0, 0), align=None)
    extrude(amount=18.286731952, mode=Mode.SUBTRACT)
    with BuildSketch(Plane(origin=(100.956634024, 23.95, -31.8), x_dir=(0, 0.027495876610585647, 0.9996219169112968), z_dir=(1, 0, 0))) as chamfer9_piece_2:
        Polygon((CHAMFER9_SIZE * 0.999621916911, CHAMFER9_SIZE * 0.0274958766106), (-CHAMFER9_SIZE * 0.0274958766106, CHAMFER9_SIZE * 0.999621916911), (0, 0), align=None)
    extrude(amount=16.286731952, mode=Mode.SUBTRACT)
    with BuildSketch(Plane(origin=(114.1, 27.093365976, -31.8), x_dir=(0.0274958766105891, 0, 0.9996219169112968), z_dir=(0, -1, 0))) as chamfer9_piece_3:
        Polygon((CHAMFER9_SIZE * 0.999621916911, CHAMFER9_SIZE * 0.0274958766106), (-CHAMFER9_SIZE * 0.0274958766106, CHAMFER9_SIZE * 0.999621916911), (0, 0), align=None)
    extrude(amount=56.086731952, mode=Mode.SUBTRACT)


solid = part.part
